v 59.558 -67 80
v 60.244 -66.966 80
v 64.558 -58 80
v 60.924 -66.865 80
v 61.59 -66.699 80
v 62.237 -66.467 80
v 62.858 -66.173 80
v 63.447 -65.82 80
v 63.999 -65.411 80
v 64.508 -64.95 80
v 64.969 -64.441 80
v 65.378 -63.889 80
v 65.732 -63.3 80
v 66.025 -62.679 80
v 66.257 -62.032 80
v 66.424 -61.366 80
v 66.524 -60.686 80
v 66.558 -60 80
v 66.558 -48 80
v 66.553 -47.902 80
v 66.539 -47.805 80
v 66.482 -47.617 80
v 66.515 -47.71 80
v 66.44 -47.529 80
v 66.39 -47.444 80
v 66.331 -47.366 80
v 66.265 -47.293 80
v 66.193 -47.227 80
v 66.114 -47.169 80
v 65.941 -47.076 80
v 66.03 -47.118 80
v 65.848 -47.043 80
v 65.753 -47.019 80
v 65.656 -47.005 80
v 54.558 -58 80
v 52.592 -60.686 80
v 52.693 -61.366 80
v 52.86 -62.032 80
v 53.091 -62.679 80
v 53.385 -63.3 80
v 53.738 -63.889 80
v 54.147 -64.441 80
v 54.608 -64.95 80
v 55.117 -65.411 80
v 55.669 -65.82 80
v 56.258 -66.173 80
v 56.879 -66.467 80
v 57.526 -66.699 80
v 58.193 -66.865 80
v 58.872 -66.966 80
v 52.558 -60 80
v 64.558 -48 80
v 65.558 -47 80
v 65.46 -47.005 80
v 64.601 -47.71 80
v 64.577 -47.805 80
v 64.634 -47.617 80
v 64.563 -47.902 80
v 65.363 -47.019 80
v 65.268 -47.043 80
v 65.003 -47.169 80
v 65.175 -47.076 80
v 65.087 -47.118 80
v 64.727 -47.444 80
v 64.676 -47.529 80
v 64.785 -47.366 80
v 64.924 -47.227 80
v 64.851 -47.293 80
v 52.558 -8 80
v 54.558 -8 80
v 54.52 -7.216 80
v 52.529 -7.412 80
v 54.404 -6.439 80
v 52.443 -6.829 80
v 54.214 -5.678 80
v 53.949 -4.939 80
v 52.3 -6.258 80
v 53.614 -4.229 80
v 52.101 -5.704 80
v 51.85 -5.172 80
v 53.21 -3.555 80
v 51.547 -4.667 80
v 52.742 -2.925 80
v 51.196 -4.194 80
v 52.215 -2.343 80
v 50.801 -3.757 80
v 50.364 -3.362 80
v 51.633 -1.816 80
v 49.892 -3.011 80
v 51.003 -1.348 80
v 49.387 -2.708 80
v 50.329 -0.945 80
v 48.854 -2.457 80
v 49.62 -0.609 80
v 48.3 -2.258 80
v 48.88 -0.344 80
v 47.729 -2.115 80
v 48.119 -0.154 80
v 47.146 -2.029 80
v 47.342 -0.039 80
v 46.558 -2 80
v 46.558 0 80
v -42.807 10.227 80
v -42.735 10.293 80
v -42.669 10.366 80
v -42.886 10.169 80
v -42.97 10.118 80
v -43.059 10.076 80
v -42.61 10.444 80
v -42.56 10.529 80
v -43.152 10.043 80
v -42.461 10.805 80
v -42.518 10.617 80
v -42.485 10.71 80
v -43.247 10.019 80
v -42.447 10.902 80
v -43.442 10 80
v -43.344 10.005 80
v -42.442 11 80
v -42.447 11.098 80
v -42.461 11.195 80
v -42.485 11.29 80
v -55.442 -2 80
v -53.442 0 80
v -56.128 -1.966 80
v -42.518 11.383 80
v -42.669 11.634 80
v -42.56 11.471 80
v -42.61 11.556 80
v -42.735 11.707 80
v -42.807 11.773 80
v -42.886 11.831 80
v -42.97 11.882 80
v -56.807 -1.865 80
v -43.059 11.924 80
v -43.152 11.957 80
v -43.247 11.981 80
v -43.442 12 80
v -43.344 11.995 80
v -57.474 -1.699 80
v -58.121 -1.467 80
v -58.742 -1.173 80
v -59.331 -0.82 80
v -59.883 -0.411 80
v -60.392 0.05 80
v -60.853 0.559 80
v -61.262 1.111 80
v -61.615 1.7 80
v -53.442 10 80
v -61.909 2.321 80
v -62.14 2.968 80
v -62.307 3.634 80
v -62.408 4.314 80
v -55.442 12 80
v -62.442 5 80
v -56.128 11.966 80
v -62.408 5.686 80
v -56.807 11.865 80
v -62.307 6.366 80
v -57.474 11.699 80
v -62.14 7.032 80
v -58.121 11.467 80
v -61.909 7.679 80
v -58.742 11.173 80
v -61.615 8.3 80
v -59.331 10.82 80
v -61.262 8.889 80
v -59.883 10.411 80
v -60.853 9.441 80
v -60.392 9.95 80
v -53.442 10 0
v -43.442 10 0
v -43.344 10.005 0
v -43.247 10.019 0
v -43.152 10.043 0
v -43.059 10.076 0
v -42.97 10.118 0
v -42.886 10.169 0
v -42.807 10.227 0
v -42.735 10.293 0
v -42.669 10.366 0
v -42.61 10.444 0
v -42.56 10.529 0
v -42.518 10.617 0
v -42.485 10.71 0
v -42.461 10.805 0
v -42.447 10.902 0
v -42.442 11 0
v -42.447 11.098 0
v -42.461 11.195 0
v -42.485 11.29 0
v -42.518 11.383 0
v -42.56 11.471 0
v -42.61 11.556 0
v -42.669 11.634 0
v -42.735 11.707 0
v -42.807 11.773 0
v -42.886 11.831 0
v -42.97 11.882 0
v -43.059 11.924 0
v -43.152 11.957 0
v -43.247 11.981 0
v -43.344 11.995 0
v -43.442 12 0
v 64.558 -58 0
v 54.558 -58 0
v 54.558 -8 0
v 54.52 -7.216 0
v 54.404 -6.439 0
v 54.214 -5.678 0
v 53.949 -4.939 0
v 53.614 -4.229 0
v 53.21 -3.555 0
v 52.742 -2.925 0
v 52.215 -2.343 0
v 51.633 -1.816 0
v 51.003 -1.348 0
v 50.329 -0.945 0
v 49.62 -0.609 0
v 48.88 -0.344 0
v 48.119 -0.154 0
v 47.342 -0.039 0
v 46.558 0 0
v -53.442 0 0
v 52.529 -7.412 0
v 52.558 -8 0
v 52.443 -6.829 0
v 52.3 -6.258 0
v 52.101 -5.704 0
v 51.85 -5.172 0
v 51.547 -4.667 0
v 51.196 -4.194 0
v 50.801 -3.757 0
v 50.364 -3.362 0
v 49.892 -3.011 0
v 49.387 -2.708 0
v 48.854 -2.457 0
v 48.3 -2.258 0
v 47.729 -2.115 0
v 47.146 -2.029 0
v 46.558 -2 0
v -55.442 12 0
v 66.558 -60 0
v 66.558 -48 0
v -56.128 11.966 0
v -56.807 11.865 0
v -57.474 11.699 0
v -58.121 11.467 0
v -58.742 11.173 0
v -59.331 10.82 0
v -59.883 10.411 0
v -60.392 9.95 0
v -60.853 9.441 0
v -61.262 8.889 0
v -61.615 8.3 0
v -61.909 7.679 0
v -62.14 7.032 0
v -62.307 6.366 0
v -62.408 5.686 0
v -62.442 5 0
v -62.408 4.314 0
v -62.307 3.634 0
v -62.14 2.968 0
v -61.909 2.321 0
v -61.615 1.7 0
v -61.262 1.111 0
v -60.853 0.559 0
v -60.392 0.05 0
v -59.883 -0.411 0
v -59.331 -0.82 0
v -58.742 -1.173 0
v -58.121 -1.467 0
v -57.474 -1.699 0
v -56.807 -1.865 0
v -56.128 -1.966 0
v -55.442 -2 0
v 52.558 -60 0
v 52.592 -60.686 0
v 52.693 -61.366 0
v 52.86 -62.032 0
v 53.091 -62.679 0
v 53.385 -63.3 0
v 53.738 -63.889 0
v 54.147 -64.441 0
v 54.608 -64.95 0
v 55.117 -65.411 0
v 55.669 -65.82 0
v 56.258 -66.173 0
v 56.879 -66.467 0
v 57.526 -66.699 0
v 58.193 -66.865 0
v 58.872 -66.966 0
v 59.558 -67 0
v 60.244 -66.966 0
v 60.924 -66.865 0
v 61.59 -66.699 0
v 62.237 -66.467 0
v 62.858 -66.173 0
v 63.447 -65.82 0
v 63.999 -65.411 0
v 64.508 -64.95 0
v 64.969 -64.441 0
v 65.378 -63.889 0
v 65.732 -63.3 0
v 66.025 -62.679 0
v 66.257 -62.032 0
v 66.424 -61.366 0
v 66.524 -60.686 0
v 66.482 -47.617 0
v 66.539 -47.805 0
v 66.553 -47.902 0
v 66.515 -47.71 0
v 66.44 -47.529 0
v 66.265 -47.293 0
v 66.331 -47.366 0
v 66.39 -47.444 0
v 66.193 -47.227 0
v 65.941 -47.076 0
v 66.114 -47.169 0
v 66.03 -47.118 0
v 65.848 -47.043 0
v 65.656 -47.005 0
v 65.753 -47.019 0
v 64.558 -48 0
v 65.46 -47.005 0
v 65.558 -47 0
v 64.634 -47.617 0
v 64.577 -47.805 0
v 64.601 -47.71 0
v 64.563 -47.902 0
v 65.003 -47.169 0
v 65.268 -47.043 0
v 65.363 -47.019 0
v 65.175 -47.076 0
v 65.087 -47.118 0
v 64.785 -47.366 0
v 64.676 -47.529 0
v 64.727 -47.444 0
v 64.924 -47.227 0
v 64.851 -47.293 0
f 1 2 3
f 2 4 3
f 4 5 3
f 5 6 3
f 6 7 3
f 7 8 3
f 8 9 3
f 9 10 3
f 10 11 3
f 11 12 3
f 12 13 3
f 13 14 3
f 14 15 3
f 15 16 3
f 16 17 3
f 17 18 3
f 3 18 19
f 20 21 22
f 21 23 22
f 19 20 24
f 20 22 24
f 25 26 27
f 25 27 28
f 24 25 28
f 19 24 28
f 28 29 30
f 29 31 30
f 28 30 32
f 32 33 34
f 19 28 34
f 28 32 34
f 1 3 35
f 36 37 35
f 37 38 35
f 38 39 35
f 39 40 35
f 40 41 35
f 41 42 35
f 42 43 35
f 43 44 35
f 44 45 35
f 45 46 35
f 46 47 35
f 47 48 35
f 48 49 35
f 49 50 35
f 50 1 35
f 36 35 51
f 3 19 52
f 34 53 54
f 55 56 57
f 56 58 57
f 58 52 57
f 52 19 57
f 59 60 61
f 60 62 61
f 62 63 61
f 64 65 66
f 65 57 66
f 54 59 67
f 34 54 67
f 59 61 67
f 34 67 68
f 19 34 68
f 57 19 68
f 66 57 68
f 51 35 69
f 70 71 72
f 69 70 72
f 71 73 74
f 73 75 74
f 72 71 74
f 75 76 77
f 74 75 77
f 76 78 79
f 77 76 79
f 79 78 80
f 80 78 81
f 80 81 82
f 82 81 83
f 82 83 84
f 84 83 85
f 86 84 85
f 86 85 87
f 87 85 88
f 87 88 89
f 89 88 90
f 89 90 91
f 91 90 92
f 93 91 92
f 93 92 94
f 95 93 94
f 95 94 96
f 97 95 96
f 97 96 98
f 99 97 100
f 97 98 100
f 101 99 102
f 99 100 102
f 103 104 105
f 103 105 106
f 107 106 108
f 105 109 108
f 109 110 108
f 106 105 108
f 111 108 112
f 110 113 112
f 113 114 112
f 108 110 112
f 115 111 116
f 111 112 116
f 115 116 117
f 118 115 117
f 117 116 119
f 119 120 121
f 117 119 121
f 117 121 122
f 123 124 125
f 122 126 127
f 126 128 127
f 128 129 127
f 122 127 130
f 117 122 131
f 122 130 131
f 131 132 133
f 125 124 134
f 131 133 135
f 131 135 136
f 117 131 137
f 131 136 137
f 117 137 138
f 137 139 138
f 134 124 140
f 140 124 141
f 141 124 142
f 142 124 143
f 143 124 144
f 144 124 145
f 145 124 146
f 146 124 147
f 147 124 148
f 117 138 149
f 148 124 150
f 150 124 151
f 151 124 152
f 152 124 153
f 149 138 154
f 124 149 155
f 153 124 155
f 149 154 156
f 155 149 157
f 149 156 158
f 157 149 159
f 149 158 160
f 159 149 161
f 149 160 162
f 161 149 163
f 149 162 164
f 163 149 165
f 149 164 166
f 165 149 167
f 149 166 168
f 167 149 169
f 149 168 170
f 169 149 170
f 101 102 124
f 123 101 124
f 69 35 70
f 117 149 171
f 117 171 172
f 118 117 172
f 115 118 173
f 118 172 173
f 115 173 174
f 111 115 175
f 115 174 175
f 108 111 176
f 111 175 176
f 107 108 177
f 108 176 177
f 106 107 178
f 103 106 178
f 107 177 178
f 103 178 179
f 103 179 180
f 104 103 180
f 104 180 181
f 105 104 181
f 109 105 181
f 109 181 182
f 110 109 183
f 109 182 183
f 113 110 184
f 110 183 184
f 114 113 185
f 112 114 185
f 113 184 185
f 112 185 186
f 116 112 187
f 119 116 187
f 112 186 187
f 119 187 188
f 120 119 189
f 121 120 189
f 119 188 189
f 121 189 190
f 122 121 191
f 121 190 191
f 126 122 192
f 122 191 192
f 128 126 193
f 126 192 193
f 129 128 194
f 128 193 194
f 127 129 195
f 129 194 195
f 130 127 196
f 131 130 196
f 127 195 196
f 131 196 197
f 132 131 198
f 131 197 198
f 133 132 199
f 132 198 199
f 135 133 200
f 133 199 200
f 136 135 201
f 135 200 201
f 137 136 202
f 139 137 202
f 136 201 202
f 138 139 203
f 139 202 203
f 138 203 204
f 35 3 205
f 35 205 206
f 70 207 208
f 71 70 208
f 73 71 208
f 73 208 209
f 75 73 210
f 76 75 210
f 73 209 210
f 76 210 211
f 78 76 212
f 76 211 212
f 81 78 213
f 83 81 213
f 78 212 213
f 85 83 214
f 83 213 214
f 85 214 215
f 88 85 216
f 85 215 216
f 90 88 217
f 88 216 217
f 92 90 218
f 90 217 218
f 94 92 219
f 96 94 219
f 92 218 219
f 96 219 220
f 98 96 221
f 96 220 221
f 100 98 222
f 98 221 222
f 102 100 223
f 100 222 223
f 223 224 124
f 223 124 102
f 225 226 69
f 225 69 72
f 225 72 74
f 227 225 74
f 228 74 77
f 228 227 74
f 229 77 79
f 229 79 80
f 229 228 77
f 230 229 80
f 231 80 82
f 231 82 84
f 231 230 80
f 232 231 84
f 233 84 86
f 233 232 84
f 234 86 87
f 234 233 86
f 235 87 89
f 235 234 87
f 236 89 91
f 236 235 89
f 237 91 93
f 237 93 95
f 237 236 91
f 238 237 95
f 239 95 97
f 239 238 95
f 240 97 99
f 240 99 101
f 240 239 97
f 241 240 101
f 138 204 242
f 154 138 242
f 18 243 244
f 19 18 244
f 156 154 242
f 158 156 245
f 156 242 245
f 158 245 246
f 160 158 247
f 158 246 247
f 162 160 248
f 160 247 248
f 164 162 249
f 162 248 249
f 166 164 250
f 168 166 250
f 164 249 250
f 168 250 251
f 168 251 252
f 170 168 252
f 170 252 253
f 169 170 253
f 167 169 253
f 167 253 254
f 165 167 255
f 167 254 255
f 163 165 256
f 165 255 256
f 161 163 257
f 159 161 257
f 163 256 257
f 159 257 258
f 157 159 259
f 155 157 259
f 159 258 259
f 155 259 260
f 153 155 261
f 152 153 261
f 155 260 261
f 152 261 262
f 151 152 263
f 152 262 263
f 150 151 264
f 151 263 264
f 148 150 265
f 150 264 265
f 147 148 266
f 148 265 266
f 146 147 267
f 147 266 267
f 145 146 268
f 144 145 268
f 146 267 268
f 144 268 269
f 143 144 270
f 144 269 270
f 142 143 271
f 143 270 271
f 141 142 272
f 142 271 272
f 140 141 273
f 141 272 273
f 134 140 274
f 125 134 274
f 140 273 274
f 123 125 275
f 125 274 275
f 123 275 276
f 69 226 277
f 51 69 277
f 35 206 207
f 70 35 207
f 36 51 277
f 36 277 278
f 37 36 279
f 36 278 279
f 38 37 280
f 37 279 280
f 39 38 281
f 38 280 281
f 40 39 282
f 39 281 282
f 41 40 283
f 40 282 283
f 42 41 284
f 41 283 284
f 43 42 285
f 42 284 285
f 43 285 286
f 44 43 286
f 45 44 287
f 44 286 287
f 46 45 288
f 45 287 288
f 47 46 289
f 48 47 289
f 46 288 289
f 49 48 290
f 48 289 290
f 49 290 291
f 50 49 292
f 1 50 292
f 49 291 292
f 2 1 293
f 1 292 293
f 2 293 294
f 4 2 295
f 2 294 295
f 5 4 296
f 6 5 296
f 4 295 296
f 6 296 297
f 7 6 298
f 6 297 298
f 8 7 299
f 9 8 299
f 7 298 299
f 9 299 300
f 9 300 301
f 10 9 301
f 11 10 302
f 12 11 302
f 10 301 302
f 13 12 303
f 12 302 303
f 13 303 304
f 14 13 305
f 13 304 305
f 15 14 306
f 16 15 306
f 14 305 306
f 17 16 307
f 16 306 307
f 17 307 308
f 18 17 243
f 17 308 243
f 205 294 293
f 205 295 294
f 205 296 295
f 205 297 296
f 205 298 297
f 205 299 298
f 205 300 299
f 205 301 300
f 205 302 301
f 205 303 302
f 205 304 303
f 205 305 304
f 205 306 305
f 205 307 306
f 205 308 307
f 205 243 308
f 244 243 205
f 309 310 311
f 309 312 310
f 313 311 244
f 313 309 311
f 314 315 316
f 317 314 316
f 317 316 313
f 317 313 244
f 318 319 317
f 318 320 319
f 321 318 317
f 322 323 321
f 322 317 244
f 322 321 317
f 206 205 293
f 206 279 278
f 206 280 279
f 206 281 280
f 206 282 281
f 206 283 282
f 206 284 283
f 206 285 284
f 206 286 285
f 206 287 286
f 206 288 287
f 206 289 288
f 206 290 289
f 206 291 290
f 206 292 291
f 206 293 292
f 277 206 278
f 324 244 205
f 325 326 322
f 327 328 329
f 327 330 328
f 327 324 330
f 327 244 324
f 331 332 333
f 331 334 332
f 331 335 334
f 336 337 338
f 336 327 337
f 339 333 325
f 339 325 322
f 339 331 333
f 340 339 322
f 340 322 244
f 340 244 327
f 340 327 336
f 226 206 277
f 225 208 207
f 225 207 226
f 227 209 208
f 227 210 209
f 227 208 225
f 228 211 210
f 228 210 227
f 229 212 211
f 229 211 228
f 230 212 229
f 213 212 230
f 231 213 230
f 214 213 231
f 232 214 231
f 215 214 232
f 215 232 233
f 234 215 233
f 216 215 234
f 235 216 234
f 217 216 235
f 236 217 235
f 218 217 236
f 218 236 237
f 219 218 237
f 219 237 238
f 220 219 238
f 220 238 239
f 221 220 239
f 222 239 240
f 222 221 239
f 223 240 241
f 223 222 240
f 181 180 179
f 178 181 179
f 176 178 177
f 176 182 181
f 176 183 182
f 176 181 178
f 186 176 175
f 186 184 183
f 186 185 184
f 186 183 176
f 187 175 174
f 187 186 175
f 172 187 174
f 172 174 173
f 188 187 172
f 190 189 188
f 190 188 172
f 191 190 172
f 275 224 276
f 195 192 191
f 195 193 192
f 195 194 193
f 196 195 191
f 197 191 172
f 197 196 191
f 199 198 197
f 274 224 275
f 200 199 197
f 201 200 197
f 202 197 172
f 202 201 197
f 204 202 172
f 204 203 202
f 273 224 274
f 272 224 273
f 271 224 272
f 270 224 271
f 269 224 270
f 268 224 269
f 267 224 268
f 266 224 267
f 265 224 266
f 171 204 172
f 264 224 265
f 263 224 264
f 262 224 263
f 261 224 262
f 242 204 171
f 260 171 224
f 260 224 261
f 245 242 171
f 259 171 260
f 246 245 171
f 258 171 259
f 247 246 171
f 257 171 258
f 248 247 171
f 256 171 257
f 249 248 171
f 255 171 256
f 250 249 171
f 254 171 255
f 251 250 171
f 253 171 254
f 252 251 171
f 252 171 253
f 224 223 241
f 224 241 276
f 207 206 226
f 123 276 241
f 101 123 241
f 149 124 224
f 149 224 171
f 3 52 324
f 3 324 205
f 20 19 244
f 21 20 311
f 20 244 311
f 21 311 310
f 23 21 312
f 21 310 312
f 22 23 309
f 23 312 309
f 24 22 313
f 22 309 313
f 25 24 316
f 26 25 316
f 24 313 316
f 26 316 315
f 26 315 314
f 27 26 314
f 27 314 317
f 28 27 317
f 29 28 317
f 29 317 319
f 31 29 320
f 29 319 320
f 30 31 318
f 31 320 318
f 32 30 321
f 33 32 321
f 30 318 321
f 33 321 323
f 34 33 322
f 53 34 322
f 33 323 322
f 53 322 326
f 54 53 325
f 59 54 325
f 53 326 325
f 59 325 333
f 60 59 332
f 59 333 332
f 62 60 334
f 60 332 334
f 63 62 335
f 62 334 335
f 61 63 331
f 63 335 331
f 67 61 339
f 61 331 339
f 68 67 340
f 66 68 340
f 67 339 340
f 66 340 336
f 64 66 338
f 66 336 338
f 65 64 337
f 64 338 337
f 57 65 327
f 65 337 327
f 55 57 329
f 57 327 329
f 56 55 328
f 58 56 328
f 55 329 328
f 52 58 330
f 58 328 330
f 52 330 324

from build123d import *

# Parameters (mm, degrees)
PAD_DEPTH = 80


with BuildPart() as part:
    # Sketch → Pad (new body)
    with BuildSketch(Plane.XY):
        with BuildLine():
            Line((-53.441865, 0), (46.558135, 0))
            ThreePointArc((54.558135, -8), (52.214989, -2.343146), (46.558135, 0))
            Line((54.558135, -58), (54.558135, -8))
            Line((64.558135, -58), (54.558135, -58))
            Line((64.558135, -48), (64.558135, -58))
            ThreePointArc((66.558135, -48), (65.558135, -47), (64.558135, -48))
            Line((66.558135, -60), (66.558135, -48))
            ThreePointArc((52.558135, -60), (59.558135, -67), (66.558135, -60))
            Line((52.558135, -8), (52.558135, -60))
            ThreePointArc((52.558135, -8), (50.800776, -3.757359), (46.558135, -2))
            Line((-55.441865, -2), (46.558135, -2))
            ThreePointArc((-55.441865, 12), (-62.441865, 5), (-55.441865, -2))
            Line((-43.441865, 12), (-55.441865, 12))
            ThreePointArc((-43.441865, 10), (-42.441865, 11), (-43.441865, 12))
            Line((-53.441865, 10), (-43.441865, 10))
            Line((-53.441865, 0), (-53.441865, 10))
        make_face()
    extrude(amount=PAD_DEPTH)


solid = part.part
